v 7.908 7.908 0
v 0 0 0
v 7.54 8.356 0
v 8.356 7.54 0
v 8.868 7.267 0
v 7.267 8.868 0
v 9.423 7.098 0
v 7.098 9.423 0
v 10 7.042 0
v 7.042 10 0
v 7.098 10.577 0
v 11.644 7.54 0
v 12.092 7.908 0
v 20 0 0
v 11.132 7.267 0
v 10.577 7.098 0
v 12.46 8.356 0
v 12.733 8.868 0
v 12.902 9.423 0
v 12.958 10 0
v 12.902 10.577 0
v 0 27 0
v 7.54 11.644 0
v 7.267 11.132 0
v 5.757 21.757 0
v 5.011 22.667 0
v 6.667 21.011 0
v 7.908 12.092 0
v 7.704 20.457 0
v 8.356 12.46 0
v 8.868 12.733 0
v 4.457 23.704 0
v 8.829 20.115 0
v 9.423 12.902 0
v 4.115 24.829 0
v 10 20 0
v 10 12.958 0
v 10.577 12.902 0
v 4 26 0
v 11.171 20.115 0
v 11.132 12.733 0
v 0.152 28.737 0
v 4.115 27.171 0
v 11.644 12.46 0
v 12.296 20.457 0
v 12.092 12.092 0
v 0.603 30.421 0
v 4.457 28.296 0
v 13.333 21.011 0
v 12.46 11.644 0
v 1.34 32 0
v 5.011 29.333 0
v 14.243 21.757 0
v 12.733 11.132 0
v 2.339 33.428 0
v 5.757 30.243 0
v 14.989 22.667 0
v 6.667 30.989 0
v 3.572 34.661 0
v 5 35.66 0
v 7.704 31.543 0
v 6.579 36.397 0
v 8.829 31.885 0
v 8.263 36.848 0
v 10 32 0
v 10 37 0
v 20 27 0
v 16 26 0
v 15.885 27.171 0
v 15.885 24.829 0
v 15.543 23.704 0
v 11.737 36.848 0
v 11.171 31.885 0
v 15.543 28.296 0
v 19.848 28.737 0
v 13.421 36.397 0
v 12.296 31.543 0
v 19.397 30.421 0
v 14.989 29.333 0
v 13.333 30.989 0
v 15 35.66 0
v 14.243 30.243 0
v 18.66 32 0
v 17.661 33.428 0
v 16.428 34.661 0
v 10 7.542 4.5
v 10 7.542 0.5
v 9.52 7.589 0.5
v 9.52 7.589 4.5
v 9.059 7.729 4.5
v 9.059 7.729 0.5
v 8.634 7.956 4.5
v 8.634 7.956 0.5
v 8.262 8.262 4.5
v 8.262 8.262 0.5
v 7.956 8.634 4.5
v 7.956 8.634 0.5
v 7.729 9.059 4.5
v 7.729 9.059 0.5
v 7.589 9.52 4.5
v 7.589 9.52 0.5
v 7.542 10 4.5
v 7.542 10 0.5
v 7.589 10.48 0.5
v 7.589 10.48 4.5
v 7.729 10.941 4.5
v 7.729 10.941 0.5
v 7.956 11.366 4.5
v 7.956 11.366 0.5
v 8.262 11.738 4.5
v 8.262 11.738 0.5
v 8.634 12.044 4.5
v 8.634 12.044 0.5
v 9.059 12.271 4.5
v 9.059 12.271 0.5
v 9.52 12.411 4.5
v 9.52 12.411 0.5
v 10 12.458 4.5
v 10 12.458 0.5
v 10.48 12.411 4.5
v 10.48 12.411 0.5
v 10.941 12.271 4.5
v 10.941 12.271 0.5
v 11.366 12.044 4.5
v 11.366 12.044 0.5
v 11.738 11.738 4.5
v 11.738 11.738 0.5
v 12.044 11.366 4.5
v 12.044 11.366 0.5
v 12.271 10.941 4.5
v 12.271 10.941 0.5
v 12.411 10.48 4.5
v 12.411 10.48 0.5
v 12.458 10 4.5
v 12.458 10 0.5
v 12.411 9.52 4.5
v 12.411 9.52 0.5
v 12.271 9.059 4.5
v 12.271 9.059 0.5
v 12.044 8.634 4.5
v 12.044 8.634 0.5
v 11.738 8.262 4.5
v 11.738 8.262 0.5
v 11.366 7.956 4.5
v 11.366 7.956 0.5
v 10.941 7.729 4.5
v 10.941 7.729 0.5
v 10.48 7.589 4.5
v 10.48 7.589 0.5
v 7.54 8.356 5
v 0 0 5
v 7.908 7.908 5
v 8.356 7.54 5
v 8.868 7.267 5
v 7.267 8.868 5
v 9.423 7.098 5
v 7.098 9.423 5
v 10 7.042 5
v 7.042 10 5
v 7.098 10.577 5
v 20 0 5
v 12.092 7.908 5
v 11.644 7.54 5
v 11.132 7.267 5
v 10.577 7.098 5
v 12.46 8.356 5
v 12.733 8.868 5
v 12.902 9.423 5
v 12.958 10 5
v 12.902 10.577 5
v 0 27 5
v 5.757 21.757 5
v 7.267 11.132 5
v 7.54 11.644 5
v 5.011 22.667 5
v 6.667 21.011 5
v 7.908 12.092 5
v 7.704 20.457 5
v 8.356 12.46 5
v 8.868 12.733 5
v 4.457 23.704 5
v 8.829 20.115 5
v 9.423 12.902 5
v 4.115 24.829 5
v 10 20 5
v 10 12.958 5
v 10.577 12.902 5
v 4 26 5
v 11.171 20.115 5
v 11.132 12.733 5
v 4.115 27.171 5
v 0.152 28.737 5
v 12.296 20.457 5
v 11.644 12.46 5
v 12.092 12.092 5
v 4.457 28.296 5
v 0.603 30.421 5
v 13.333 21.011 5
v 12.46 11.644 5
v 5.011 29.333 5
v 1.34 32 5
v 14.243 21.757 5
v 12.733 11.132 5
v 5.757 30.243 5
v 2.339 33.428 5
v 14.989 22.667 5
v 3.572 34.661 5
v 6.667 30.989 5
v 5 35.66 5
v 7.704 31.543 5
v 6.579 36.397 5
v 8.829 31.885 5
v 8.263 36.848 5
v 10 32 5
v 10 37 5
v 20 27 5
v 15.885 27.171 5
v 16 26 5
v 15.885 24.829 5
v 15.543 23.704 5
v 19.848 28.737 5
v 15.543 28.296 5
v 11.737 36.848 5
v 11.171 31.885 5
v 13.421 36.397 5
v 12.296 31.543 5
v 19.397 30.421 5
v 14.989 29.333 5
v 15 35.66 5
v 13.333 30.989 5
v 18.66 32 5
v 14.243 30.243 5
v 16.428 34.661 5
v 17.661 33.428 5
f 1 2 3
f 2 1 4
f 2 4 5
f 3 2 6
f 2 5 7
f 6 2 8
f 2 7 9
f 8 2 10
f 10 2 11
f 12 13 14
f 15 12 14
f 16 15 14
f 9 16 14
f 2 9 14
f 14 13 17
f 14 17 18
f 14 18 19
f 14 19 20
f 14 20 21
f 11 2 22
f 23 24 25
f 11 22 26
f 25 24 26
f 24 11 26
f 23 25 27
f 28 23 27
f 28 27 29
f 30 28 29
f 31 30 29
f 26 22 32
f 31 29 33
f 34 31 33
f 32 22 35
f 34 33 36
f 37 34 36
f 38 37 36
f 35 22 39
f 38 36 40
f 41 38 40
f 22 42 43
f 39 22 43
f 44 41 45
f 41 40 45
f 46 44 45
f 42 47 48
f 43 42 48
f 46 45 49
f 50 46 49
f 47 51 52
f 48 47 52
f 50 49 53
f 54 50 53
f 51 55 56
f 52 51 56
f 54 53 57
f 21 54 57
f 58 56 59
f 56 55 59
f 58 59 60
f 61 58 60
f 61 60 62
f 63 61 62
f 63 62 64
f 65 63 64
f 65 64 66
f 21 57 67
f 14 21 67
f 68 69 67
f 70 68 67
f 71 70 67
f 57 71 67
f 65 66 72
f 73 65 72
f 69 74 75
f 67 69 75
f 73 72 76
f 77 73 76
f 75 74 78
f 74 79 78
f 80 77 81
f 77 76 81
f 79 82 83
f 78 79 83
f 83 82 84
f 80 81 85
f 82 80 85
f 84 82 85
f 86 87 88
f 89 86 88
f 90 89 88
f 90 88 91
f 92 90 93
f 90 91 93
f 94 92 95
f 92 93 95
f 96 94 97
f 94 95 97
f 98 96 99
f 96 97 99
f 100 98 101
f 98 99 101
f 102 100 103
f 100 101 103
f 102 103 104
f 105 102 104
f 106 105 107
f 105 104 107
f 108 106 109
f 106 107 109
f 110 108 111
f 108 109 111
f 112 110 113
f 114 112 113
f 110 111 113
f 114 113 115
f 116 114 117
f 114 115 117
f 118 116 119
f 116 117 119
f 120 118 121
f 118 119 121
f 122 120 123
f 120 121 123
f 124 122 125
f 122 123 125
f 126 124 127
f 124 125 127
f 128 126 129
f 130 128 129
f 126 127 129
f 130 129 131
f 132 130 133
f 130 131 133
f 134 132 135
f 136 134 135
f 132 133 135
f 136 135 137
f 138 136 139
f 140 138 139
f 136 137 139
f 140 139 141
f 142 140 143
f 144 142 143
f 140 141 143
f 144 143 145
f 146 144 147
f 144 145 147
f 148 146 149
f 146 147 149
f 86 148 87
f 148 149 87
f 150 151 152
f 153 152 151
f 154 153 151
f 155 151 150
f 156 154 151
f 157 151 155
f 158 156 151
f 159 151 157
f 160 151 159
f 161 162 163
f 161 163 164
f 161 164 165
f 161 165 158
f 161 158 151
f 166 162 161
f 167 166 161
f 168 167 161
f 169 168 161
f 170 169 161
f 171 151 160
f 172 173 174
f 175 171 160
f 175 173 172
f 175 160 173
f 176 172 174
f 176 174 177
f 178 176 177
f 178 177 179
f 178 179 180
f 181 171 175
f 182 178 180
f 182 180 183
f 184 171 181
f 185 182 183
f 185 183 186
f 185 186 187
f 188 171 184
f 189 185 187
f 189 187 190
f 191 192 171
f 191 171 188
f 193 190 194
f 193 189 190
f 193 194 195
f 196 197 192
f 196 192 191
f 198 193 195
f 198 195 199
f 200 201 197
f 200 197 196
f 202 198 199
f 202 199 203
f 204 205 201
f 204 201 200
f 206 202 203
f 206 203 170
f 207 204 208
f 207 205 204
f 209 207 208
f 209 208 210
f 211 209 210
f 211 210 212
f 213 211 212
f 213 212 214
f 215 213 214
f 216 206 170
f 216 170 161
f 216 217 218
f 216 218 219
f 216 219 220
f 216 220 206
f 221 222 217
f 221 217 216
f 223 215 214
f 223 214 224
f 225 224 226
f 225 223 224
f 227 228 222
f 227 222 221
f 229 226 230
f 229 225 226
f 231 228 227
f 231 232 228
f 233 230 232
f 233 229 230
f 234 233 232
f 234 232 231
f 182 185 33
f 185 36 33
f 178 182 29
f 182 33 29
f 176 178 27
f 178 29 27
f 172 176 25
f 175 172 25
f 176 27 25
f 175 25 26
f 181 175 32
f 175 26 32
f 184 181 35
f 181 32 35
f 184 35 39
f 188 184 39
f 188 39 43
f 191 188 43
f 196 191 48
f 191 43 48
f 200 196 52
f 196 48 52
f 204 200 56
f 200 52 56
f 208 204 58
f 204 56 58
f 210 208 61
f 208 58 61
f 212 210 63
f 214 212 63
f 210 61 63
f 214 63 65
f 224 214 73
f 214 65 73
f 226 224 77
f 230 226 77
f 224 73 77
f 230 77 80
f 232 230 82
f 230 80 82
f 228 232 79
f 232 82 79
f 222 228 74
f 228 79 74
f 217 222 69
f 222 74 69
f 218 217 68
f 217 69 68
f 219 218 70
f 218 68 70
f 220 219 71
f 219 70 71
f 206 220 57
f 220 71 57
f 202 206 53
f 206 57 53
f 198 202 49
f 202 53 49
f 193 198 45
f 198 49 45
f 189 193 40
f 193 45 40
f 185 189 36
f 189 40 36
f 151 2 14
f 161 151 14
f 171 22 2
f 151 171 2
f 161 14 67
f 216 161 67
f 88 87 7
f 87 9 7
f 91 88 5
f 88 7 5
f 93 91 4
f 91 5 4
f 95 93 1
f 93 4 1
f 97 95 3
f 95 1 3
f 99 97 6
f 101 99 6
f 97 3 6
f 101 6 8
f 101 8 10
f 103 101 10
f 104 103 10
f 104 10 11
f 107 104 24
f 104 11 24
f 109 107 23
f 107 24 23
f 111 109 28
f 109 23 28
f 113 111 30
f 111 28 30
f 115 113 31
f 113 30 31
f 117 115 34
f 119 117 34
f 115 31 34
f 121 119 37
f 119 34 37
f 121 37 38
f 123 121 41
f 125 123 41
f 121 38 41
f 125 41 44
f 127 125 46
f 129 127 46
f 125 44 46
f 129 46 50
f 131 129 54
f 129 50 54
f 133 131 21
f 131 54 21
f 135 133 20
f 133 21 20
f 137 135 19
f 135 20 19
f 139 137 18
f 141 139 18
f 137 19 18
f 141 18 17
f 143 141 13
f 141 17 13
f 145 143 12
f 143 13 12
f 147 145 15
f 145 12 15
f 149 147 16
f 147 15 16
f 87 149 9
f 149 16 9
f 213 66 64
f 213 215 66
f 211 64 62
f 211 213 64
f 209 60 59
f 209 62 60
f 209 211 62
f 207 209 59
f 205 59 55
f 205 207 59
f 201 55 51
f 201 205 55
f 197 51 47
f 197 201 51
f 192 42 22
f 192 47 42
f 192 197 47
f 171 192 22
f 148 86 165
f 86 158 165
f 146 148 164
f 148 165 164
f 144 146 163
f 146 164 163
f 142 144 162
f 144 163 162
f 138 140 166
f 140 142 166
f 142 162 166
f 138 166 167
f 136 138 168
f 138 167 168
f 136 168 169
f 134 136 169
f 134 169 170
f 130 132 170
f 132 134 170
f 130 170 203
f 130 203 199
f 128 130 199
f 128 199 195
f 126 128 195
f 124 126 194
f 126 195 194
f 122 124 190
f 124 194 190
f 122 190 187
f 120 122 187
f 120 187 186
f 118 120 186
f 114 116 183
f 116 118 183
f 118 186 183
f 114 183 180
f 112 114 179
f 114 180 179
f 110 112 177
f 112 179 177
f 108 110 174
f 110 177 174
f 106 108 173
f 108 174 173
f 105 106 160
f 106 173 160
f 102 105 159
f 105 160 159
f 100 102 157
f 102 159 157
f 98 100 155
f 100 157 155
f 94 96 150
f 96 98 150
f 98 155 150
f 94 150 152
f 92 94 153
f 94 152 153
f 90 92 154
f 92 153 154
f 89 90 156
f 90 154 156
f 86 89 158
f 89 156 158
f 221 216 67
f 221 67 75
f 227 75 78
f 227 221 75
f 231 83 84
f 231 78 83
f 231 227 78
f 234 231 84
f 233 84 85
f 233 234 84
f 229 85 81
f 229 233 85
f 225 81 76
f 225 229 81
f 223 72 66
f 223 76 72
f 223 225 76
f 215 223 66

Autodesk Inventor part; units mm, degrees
ref_plane "YZ Plane" through (0, 0, 0) normal (1, 0, 0) x (0, 1, 0)
ref_plane "XZ Plane" through (0, 0, 0) normal (0, 1, 0) x (-1, 0, 0)
ref_plane "XY Plane" through (0, 0, 0) normal (0, 0, 1) x (1, 0, 0)
sketch "Sketch1" plane through (0, 0, 0) normal (0, 0, 1) x (1, 0, 0)
  line L0 (0, 0) -> (20, 0)
  line L1 (20, 0) -> (20, 37)
  line L2 (20, 37) -> (0, 37)
  line L3 (0, 37) -> (0, 0)
  dimension "d0" = 20
  dimension "d1" = 37
extrude "Extrusion1" add sketch "Sketch1" along normal blind 5
sketch "Sketch2" plane through (0, 0, 5) normal (0, 0, 1) x (1, 0, 0)
  line L0 (20, 0) -> (0, 0) projected
  line L1 (20, 37) -> (20, 0) projected
  point P0 (10, 26)
  dimension "d4" = 26
  dimension "d5" = 10
hole "Hole1" at (10, 26, 5) direction (0, 0, -1) diameter 12 depth 5 tip angle 118
fillet "Fillet1" radius 10 2 edges at (20, 37, 2.5) (0, 37, 2.5)
sketch "Sketch3" plane through (0, 0, 5) normal (0, 0, 1) x (1, 0, 0)
  line L0 (0, 0) -> (0, 27) projected
  line L1 (20, 0) -> (0, 0) projected
  point P0 (10, 10)
  dimension "d14" = 10
  dimension "d15" = 10
hole "Hole2" at (10, 10, 5) direction (0, 0, -1) diameter 4.917 depth 6 tip angle 118 thread size "M6x1" class "6H" standard "ANSI Metric M Profile"
chamfer "Chamfer1" distance 0.5 angle 45 2 edges at (10, 12.4585, 5) (10, 12.4585, 0)
properties part number "SUPORTE DO EIXO TRASEIRO(51)" material "Carbon Steel"
